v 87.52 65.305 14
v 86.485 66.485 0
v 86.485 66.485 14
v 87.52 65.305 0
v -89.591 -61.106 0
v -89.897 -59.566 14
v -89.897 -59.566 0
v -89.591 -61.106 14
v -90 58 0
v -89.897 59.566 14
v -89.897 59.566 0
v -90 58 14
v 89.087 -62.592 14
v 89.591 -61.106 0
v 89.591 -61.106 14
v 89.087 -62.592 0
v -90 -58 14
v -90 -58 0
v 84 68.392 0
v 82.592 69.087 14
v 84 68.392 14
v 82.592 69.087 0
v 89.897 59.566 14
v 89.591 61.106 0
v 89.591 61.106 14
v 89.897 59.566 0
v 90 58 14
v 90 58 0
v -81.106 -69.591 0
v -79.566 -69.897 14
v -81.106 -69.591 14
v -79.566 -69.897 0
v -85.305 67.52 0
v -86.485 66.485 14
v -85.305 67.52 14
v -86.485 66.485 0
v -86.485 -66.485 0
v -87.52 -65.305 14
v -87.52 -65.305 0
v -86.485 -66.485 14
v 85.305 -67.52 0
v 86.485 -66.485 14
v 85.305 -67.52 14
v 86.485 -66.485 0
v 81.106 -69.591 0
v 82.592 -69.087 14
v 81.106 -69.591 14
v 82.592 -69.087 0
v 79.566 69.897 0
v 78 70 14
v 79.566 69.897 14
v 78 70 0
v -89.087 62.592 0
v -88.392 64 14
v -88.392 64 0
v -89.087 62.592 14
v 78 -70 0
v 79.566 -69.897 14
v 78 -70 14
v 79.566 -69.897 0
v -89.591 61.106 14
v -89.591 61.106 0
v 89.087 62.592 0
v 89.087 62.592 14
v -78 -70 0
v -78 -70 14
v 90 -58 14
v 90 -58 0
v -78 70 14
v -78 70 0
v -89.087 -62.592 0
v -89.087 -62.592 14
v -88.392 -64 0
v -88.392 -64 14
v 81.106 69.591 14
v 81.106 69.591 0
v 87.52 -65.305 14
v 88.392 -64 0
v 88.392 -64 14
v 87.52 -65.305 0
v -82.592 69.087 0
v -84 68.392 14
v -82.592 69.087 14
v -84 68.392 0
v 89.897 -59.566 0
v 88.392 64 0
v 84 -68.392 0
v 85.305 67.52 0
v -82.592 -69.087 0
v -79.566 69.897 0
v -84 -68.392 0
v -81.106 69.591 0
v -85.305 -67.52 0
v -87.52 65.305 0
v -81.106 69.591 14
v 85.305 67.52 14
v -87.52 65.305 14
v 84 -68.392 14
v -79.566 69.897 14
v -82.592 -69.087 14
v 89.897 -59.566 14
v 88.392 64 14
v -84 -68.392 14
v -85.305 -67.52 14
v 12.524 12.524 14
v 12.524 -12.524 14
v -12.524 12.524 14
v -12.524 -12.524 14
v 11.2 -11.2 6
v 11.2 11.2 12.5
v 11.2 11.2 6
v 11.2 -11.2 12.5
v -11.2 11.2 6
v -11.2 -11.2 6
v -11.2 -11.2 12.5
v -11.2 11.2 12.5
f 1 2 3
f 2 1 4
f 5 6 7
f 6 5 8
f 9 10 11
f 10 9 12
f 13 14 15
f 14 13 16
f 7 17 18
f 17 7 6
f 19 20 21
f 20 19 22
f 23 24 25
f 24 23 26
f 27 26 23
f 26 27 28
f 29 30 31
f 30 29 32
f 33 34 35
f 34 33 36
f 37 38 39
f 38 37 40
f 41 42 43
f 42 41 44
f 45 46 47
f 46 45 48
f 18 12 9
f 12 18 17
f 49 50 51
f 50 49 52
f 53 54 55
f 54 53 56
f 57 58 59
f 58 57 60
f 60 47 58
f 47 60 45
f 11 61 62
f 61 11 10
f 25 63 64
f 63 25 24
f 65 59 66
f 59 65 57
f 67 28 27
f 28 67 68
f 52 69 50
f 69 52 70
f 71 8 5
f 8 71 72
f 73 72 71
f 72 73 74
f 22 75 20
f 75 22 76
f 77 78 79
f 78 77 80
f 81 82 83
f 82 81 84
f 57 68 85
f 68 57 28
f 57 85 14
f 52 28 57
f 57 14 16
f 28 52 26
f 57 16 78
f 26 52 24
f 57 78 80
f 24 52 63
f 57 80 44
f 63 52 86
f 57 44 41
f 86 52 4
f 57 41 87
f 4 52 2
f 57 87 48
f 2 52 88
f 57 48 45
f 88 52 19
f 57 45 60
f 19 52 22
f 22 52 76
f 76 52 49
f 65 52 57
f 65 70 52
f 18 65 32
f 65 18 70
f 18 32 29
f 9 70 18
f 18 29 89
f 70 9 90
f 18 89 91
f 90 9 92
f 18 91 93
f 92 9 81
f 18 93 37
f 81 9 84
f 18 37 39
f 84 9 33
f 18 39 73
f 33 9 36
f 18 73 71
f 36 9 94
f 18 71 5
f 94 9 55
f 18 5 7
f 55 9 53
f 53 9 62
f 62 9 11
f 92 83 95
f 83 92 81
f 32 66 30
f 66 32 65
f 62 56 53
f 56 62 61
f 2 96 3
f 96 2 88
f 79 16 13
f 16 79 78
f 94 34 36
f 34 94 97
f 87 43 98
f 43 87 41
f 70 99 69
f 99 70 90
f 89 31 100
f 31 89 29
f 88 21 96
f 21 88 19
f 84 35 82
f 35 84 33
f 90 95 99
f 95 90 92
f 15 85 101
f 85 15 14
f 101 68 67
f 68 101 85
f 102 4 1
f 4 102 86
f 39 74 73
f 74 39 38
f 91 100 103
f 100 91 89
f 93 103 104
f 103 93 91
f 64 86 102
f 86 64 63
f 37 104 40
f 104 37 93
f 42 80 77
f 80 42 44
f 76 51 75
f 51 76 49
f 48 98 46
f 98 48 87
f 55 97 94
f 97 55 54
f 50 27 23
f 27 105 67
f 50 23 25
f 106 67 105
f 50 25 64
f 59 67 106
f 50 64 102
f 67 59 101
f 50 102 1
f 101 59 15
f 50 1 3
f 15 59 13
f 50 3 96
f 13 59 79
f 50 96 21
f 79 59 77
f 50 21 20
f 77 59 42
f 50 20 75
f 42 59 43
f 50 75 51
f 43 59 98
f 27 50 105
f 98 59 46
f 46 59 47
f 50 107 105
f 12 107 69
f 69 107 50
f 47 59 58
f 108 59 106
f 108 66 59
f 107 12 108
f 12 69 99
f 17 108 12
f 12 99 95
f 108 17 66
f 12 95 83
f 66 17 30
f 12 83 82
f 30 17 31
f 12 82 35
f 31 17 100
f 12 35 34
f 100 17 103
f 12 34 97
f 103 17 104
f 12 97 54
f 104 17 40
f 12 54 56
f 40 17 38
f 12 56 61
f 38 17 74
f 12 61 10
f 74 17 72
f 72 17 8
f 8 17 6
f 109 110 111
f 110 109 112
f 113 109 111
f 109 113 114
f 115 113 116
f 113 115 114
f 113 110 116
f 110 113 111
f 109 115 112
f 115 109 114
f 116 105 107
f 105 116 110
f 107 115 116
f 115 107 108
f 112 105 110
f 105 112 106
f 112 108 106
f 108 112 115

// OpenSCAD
/* Headphone stand in three parts: base, post, hanger */
/* [Parts] */
part = "base"; // [base,post,hanger,assembly]

cadverify_only = "";
module instance(name, part, unit = 1) {
    echo(cadverify_instance = [name, part, unit]);
    if (cadverify_only == "" || cadverify_only == name) children();
}

// ---------- parameters (mm) ----------
base_L = 180;
base_W = 140;
base_H = 14;
base_corner_r = 12;
base_sock_S = 22.4;
base_sock_H = 8;
base_flare_H = 1.5;

post_bot_tenon_S = 22;
post_bot_tenon_H = 8;
post_bot_cham_H = 4;
post_body_bot_S = 30;
post_body_top_S = 24;
post_body_H = 232;
post_top_tenon_S = 18;
post_top_tenon_H = 8;
// total post height = 8+4+232+8 = 252

hanger_L = 110;
hanger_W = 44;
hanger_H = 20;
hanger_sock_S = 18.4;
hanger_sock_H = 8;
hanger_roof_H = 9.2; // half width, 45 deg pyramid

assembly_top = 270;
post_Z_in_assembly = 6;      // post print z0 sits at 6 in assembly
hanger_Z_in_assembly = 250;  // hanger print z0 sits at 250

// ---------- modules (print orientation, min z = 0) ----------
module base() {
    difference() {
        linear_extrude(height = base_H)
            hull() {
                translate([-base_L/2+base_corner_r, -base_W/2+base_corner_r]) circle(r = base_corner_r, $fn = 48);
                translate([ base_L/2-base_corner_r, -base_W/2+base_corner_r]) circle(r = base_corner_r, $fn = 48);
                translate([-base_L/2+base_corner_r,  base_W/2-base_corner_r]) circle(r = base_corner_r, $fn = 48);
                translate([ base_L/2-base_corner_r,  base_W/2-base_corner_r]) circle(r = base_corner_r, $fn = 48);
            }
        // straight socket 22.4 x 22.4 from z=6 to top
        translate([-base_sock_S/2, -base_sock_S/2, base_H - base_sock_H])
            cube([base_sock_S, base_sock_S, base_sock_H + 0.2]);
        // 45 deg entry flare, 1.5 tall: 22.4 at bottom -> 25.4 at top
        translate([0, 0, base_H - base_flare_H])
            linear_extrude(height = base_flare_H + 0.2, scale = (base_sock_S + 2*base_flare_H)/base_sock_S)
                square([base_sock_S, base_sock_S], center = true);
    }
}

module post() {
    // bottom tenon 22x22x8 on bed
    translate([-post_bot_tenon_S/2, -post_bot_tenon_S/2, 0])
        cube([post_bot_tenon_S, post_bot_tenon_S, post_bot_tenon_H]);
    // 45 deg frustum 22 -> 30, 4 tall
    translate([0, 0, post_bot_tenon_H])
        linear_extrude(height = post_bot_cham_H, scale = post_body_bot_S/post_bot_tenon_S)
            square([post_bot_tenon_S, post_bot_tenon_S], center = true);
    // tapered body 30 -> 24, 232 tall
    translate([0, 0, post_bot_tenon_H + post_bot_cham_H])
        linear_extrude(height = post_body_H, scale = post_body_top_S/post_body_bot_S)
            square([post_body_bot_S, post_body_bot_S], center = true);
    // top tenon 18x18x8
    translate([-post_top_tenon_S/2, -post_top_tenon_S/2, post_bot_tenon_H + post_bot_cham_H + post_body_H])
        cube([post_top_tenon_S, post_top_tenon_S, post_top_tenon_H]);
}

module hanger() {
    difference() {
        hull() {
            translate([-55, -22, 0]) cube([110, 44, 8]);
            translate([-50, -19, 0]) cube([20, 38, 14]);
            translate([-15, -16, 0]) cube([30, 32, 20]);
            translate([30, -19, 0]) cube([20, 38, 14]);
        }
        // straight socket 18.4x18.4, 0-8.1
        translate([-hanger_sock_S/2, -hanger_sock_S/2, -0.1])
            cube([hanger_sock_S, hanger_sock_S, hanger_sock_H + 0.2]);
        // 45 deg pyramid roof, base 18.4 at z=7.9, apex at z=17.1
        translate([0, 0, 7.9])
            linear_extrude(height = 9.2, scale = 0)
                square([hanger_sock_S, hanger_sock_S], center = true);
    }
}

module assembly() {
    instance("base_1", "base") translate([0, 0, 0]) base();
    instance("post_1", "post") translate([0, 0, post_Z_in_assembly]) post();
    instance("hanger_1", "hanger") translate([0, 0, hanger_Z_in_assembly]) hanger();
}

// ---------- spec ----------
if (part == "base") {
    echo(cadverify_spec = [
        ["bounds", [[-90, -70, 0], [90, 70, 14]]],
        ["bodies", 1],
        ["through_holes", 0],
        ["support_faces", [["base_bottom", "-z", 20000]]],
        ["overhangs_allowed", []],
        ["copies", 1],
        ["details", [
            ["base_plate", "material", [[-90, -70, 0], [90, 70, 6]], 0.9],
            ["socket_void", "void", [[-11.2, -11.2, 6], [11.2, 11.2, 12.5]], 0.9],
            ["mouth_flare", "hole", [0, 0, 20], [0, 0, -1], [[0, 28.2], [1.5, 25.3]]],
            ["floor", "thickness", [0, 0, -5], [0, 0, 1], 6]
        ]]
    ]);
} else if (part == "post") {
    echo(cadverify_spec = [
        ["bounds", [[-15, -15, 0], [15, 15, 252]]],
        ["bodies", 1],
        ["through_holes", 0],
        ["support_faces", [["tenon_bottom", "-z", 400]]],
        ["overhangs_allowed", []],
        ["copies", 1],
        ["details", [
            ["bottom_tenon", "material", [[-11, -11, 0], [11, 11, 8]], 0.9],
            ["body_inner", "material", [[-11, -11, 30], [11, 11, 100]], 0.9],
            ["top_tenon", "material", [[-9, -9, 244], [9, 9, 252]], 0.9],
            ["side_wall", "thickness", [-30, 0, 100], [1, 0, 0], 27]
        ]]
    ]);
} else if (part == "hanger") {
    echo(cadverify_spec = [
        ["bounds", [[-55, -22, 0], [55, 22, 20]]],
        ["bodies", 1],
        ["through_holes", 0],
        ["support_faces", [["hanger_bottom", "-z", 3500]]],
        ["overhangs_allowed", []],
        ["copies", 1],
        ["details", [
            ["base_solid", "material", [[-20, -15, 0], [20, 15, 8]], 0.9],
            ["center_top", "material", [[-15, -15, 12], [15, 15, 18]], 0.9],
            ["contact_patch", "material", [[-20, -15, 8], [20, 15, 12]], 0.9],
            ["socket_void", "void", [[-9.2, -9.2, 0], [9.2, 9.2, 8]], 0.9],
            ["roof_void", "void", [[-9.2, -9.2, 8], [9.2, 9.2, 17.2]], 0.3],
            ["socket_entry", "hole", [0, 0, -5], [0, 0, 1], [[0, 18.4], [8, 18.4]]],
            ["floor", "thickness", [0, 0, 30], [0, 0, -1], 2.5],
            ["edge_thickness", "thickness", [50, 0, 30], [0, 0, -1], 13]
        ]]
    ]);
} else if (part == "assembly") {
    echo(cadverify_spec = [
        ["bounds", [[-90, -70, 0], [90, 70, 270]]],
        ["support_faces", [["desk", "-z", 20000]]],
        ["allowed_interferences", []],
        ["motions", []],
        ["assembly_order", [
            [["base_1"], [0, 0, 0]],
            [["post_1"], [0, 0, -1]],
            [["hanger_1"], [0, 0, -1]]
        ]]
    ]);
}

// ---------- output ----------
if (part == "base") base();
else if (part == "post") post();
else if (part == "hanger") hanger();
else if (part == "assembly") assembly();
